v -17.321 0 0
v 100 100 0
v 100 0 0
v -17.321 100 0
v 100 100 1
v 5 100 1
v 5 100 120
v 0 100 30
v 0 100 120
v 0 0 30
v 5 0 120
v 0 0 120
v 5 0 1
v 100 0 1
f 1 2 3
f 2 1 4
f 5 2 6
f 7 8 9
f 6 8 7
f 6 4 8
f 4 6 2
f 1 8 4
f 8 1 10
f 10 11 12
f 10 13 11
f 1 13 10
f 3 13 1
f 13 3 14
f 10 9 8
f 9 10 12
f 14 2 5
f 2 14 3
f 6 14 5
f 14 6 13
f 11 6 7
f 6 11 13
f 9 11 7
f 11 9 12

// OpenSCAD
base_length = 100;
base_width = 1;
depth = 100;
side_height = 120;
side_width = 5;
triangle_height = 20;

cube([base_length, depth, base_width]);
cube([side_width, depth, side_height]);
difference() {
    translate([0, 0, triangle_height / 2]) {
        rotate([-90, 30, 0]) {
            cylinder(depth, triangle_height, triangle_height, $fn = 3);
        }
    }
    cube([base_length, depth, side_height]);
}
